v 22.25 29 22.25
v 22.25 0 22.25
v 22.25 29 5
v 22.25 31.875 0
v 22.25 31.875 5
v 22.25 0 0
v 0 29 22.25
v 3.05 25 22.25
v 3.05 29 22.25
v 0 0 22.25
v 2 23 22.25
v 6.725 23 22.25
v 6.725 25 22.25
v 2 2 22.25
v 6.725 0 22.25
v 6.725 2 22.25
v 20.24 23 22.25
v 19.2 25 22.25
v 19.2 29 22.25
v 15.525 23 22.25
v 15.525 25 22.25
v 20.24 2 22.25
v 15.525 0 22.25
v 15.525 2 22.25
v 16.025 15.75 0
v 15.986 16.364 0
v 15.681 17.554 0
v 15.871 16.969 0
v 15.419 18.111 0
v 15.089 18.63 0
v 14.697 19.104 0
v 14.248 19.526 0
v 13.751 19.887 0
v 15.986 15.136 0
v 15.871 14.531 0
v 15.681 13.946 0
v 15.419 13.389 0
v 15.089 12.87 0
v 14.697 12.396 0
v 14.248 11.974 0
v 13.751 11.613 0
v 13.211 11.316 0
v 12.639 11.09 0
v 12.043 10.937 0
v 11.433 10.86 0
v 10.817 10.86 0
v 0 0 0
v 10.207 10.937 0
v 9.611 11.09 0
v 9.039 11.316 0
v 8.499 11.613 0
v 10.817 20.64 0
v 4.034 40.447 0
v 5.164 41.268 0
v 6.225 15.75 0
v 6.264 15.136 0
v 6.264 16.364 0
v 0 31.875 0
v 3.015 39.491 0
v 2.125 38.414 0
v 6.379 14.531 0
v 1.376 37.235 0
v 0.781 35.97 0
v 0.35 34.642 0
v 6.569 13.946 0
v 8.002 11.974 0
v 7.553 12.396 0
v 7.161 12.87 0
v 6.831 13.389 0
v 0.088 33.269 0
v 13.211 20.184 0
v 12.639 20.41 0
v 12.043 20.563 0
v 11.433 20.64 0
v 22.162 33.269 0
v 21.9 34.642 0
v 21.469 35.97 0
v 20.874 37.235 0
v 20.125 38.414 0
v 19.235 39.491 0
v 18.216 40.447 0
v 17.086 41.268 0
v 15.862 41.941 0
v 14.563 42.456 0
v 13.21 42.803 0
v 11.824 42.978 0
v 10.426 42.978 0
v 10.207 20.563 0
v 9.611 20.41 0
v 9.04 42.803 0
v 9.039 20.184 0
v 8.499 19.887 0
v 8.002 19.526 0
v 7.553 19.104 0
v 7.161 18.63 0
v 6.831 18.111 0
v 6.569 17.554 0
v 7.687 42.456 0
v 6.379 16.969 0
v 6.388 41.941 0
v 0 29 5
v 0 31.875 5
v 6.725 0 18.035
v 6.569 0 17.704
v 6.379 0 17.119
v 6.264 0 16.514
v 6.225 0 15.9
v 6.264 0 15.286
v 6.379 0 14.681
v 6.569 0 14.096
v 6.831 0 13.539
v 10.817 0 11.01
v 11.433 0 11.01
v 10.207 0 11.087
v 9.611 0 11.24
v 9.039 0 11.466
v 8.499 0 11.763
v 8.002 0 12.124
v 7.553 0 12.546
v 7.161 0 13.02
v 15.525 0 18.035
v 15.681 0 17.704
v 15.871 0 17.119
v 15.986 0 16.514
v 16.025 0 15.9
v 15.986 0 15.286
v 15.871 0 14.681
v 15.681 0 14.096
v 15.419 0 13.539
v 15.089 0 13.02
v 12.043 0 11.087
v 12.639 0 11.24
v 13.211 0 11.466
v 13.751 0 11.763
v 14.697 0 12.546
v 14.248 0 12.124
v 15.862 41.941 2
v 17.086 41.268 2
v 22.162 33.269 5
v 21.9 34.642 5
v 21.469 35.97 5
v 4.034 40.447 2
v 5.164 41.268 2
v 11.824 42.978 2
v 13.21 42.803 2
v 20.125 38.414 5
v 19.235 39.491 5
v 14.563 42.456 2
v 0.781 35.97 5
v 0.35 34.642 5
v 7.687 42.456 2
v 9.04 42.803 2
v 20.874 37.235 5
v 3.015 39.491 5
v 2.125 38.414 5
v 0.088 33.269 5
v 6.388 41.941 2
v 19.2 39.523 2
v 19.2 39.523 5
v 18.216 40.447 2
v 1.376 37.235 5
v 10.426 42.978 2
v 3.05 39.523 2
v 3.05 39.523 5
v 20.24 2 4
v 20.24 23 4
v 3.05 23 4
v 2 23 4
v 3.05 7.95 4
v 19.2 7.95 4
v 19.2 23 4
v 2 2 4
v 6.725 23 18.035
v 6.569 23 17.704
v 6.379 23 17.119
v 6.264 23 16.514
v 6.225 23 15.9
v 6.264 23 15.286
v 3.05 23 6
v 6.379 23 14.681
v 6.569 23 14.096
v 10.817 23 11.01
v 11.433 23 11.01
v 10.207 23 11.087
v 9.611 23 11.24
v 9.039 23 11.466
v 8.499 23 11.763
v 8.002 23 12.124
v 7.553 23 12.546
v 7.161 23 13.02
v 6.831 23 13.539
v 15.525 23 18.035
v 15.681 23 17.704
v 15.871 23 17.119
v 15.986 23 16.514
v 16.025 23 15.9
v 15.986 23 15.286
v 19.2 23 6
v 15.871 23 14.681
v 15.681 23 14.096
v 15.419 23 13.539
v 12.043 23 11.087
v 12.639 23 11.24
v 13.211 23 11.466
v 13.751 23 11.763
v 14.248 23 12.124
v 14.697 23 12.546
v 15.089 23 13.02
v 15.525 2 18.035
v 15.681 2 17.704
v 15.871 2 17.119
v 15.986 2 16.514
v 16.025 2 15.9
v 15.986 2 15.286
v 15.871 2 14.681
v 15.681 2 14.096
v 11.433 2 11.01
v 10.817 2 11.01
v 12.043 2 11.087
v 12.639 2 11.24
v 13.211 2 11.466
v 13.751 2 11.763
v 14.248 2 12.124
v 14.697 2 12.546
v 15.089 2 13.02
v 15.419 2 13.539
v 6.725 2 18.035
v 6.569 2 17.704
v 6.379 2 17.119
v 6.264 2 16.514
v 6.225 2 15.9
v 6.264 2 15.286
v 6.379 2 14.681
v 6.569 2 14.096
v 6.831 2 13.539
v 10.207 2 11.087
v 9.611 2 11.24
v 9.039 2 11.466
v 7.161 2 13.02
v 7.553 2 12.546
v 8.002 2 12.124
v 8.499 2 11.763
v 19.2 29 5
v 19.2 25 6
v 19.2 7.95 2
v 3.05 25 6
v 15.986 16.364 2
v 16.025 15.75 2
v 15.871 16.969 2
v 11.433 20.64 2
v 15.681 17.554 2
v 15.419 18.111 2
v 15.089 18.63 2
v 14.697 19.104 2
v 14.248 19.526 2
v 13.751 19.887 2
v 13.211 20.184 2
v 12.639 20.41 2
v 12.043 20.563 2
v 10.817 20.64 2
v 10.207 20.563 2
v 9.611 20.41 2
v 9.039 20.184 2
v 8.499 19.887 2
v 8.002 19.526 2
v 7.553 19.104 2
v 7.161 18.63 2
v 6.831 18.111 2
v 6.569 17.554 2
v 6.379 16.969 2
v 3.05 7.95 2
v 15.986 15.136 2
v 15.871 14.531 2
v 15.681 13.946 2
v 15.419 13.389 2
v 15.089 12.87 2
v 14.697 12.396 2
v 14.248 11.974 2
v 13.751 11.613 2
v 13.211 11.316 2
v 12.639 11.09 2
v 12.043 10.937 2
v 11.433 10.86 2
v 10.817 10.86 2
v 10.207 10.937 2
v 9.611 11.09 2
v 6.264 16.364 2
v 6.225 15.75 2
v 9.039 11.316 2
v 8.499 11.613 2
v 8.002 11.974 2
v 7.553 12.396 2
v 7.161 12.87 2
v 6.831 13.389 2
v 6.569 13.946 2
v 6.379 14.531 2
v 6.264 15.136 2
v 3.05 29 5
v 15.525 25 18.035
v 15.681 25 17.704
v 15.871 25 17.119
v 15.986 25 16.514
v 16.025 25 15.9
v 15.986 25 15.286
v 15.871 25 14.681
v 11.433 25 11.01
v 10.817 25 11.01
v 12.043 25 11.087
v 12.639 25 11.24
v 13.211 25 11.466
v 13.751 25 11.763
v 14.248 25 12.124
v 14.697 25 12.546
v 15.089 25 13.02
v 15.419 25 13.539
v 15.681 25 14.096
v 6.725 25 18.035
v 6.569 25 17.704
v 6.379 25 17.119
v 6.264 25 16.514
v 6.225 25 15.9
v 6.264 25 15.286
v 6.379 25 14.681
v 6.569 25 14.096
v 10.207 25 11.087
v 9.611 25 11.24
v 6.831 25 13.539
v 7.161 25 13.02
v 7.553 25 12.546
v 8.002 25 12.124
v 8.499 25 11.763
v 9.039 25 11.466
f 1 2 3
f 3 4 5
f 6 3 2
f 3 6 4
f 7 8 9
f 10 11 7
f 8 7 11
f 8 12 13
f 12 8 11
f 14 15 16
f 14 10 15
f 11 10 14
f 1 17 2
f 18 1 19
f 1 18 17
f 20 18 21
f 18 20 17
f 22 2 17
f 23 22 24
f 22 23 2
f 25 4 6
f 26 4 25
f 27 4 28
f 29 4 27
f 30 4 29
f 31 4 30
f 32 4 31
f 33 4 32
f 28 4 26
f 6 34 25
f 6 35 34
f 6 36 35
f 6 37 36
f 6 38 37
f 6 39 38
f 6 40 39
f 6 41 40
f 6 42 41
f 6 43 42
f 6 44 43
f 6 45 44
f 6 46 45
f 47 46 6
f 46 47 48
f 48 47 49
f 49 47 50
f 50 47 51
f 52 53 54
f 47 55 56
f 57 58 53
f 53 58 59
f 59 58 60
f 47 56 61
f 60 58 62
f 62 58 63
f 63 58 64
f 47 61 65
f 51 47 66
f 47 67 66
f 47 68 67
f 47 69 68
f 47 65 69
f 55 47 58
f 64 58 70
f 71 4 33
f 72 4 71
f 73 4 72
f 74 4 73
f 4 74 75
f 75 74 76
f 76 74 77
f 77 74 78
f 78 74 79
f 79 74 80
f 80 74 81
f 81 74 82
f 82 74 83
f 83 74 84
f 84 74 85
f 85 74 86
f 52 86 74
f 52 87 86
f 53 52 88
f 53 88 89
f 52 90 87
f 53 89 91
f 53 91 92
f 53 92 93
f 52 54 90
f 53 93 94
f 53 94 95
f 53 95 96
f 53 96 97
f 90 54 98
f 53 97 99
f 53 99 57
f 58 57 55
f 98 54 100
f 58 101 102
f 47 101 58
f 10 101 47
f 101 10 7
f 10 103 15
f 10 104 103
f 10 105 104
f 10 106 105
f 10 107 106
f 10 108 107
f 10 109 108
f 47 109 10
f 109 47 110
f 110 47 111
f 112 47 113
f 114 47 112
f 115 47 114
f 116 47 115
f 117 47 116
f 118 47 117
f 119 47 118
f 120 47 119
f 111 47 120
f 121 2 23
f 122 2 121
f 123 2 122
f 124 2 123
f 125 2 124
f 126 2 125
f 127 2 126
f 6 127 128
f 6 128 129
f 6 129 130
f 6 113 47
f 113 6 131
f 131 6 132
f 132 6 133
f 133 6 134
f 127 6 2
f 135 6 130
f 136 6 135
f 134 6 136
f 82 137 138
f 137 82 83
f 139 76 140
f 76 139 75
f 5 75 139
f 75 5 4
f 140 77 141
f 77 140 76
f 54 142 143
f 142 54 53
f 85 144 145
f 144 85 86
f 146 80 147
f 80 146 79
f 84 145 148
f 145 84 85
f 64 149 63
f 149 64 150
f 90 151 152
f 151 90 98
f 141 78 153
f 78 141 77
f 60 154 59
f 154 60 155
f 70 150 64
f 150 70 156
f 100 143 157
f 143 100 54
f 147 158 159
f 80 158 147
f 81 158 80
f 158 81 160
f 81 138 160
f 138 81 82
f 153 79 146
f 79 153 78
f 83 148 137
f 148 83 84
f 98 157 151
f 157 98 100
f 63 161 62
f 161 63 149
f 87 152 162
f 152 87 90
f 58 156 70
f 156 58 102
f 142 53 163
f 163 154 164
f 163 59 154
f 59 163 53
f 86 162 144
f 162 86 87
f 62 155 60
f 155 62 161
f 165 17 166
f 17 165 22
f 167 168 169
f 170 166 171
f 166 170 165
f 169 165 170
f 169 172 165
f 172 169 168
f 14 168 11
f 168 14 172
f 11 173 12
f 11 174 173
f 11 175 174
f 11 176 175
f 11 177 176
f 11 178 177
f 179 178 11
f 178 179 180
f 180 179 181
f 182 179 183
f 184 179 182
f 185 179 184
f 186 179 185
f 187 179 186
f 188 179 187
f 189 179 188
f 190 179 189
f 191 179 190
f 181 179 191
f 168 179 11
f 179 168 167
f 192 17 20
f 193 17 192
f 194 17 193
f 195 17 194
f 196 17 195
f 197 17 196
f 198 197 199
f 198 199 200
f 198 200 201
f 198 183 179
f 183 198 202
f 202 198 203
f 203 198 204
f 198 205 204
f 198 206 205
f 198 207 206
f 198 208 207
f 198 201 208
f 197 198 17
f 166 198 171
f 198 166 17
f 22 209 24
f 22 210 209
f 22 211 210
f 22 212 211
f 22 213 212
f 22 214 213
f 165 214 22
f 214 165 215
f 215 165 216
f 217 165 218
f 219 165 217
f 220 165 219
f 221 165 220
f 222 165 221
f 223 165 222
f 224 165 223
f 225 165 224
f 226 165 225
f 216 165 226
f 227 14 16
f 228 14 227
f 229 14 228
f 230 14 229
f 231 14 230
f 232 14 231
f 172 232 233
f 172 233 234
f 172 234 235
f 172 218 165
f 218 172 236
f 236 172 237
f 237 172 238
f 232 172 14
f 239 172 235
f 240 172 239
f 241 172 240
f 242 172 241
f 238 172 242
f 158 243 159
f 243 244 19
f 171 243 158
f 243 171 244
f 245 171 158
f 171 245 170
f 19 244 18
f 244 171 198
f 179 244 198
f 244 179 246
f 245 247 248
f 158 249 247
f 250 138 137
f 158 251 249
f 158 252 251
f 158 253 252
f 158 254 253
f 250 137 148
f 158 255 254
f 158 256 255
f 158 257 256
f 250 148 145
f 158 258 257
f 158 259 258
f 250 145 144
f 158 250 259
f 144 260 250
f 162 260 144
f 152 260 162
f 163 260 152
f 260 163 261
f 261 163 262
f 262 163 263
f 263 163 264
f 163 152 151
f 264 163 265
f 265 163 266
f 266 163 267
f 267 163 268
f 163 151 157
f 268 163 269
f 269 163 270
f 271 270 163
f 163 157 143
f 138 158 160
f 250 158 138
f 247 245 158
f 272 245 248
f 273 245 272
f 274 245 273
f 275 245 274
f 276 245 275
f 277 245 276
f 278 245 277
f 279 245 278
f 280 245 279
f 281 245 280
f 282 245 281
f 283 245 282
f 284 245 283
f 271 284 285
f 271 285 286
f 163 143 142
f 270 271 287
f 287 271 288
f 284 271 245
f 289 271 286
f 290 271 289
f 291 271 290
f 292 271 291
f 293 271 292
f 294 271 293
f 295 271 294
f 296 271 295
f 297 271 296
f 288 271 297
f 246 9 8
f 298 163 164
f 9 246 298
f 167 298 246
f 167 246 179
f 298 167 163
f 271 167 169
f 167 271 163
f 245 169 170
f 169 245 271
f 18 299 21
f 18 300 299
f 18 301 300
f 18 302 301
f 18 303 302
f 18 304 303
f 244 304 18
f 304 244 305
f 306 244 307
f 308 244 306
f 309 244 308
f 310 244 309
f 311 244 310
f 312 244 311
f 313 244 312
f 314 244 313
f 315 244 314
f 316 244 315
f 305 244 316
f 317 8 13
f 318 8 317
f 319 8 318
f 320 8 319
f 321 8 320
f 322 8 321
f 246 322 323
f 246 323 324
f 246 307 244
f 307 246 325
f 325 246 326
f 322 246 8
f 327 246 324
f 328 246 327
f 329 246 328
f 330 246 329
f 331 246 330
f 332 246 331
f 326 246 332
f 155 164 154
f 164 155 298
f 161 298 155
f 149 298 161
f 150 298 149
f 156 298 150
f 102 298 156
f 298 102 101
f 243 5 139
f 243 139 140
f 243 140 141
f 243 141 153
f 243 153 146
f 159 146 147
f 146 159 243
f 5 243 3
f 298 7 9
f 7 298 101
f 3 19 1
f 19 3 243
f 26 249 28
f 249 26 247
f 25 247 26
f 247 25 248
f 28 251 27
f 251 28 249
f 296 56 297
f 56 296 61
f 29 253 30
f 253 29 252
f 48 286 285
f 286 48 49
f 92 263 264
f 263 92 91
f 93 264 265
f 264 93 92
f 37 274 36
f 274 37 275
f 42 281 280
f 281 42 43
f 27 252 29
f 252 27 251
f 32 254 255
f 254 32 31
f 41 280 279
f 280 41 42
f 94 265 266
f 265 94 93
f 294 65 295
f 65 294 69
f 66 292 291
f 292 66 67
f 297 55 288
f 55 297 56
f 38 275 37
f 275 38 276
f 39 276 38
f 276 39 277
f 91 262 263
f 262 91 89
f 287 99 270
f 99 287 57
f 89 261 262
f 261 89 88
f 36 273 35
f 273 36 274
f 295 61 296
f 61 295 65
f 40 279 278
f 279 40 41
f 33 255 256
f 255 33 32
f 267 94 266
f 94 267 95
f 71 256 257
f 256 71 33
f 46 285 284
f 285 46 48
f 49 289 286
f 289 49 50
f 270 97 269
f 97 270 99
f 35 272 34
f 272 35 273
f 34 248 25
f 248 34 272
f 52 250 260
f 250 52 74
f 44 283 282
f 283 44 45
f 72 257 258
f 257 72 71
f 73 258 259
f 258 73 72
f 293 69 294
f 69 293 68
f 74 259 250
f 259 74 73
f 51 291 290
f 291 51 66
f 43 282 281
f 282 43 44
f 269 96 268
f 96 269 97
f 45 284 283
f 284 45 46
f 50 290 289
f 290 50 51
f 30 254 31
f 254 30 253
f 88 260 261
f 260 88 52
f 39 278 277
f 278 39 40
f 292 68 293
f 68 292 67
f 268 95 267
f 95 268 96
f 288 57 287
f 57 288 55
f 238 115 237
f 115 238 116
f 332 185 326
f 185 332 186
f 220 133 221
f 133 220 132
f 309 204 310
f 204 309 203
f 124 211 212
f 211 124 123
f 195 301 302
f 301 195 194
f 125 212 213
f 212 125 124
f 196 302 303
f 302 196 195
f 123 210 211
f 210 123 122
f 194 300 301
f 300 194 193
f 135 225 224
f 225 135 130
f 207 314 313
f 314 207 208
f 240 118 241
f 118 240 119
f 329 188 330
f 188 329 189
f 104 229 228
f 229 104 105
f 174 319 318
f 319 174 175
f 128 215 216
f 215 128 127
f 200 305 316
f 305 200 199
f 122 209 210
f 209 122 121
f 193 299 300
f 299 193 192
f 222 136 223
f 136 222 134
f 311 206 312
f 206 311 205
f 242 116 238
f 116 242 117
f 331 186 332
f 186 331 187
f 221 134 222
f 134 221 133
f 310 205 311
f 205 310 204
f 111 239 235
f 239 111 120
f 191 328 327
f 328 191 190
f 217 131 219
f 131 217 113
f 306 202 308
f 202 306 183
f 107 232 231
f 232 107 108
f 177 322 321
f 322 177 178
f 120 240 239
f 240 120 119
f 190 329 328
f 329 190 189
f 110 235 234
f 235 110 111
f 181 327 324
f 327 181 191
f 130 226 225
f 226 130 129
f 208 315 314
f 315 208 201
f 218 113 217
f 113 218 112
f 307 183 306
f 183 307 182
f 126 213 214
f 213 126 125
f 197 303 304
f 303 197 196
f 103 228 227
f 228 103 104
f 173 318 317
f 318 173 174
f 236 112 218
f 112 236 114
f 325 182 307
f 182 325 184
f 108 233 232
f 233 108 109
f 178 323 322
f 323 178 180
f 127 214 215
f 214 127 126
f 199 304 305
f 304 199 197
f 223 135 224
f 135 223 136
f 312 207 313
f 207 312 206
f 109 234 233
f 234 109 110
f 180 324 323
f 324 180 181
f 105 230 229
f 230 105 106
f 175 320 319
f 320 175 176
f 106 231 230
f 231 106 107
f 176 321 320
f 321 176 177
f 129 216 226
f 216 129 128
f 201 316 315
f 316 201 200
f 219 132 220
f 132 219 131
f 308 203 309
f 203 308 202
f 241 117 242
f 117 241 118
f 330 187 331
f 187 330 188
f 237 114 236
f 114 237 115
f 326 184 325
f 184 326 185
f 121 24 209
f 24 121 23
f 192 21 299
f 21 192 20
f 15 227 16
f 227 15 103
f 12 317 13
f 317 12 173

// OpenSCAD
// 22.25
// 43.00
// 22.32



//--main frame
module Main_frame(){
cube([22.25,43-22.25/2,22.25], false);
translate([(22.25/2),43-22.25/2,0]) {
    cylinder($fn=50,22.25, d = 22.25,true);
}
}

//--shaft hole
module Shaft_hole() {
    rotate([90,0,0]){
    translate([22.25/2,15.9,-80]){
        cylinder($fn=50,100,d=9.8,true);
        }
    }
}

module Upper_Slot() {
    translate([22.25/2,0,18.5]){
      // rotate([0,45,0]){
        cube([8.8,100,8.8],true);
        }
   // }
}

module Lower_Slot() {
    translate([0,14,-6]){
      // rotate([0,45,0]){
        cube([16,30,6.5],true);
        }
   // }
}

module Vertical_Cuts() {
//--back cut 1
    translate([2,2,4]) {
        cube([18.24,21,22.25], false);
      }
//--back cut 2 - nut recess
    translate([3.05,7.95,2]) {
        cube([16.15,30,4], false);
      }

    //--front slot 1
    translate([3.05,25,2]) {
        cube([16.15,30,25], false);
        }
        
    //--front slot 2
    translate([-1,29,5]) {
        cube([35,30,25], false);
       }
    
    //--back hole
    translate([22.25/2,15.75,-1]) {
        rotate([0,0,0]){    
            cylinder($fn=50,80,d=9.8,false);
        }
    }
  
}

//--combine objects
difference() {
    Main_frame();
    Shaft_hole();
    Upper_Slot();
   // Lower_Slot();
    Vertical_Cuts();
}  
